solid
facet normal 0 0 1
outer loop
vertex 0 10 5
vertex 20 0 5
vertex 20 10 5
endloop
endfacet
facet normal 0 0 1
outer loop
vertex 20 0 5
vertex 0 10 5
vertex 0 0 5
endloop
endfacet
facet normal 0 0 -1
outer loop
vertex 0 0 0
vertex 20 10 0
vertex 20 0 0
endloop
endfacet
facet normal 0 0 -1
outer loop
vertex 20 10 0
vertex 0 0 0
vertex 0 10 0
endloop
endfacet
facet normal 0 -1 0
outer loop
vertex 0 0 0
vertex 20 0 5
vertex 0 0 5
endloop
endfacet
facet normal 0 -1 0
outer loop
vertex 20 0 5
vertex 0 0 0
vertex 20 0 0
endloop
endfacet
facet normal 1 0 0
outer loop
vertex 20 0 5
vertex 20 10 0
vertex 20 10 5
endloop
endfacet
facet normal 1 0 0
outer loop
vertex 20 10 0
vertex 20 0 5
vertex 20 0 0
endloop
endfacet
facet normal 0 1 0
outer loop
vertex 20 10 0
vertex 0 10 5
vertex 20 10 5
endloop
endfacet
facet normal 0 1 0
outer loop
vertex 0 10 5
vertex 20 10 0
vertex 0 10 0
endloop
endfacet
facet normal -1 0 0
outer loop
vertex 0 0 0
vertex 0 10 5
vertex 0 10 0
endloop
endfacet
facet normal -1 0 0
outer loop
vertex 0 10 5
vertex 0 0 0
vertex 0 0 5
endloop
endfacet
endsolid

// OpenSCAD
// SPDX-License-Identifier: AGPL-3.0-or-later
/* [Maten] */
// Breedte
width = 20; // [1:1:200]
// Diepte
depth = 10; // [1:200]
// Hoogte
height = 5; // [1:200]
/* [Hidden] */
internal_scale = 1;
cube([width, depth, height] * internal_scale);
